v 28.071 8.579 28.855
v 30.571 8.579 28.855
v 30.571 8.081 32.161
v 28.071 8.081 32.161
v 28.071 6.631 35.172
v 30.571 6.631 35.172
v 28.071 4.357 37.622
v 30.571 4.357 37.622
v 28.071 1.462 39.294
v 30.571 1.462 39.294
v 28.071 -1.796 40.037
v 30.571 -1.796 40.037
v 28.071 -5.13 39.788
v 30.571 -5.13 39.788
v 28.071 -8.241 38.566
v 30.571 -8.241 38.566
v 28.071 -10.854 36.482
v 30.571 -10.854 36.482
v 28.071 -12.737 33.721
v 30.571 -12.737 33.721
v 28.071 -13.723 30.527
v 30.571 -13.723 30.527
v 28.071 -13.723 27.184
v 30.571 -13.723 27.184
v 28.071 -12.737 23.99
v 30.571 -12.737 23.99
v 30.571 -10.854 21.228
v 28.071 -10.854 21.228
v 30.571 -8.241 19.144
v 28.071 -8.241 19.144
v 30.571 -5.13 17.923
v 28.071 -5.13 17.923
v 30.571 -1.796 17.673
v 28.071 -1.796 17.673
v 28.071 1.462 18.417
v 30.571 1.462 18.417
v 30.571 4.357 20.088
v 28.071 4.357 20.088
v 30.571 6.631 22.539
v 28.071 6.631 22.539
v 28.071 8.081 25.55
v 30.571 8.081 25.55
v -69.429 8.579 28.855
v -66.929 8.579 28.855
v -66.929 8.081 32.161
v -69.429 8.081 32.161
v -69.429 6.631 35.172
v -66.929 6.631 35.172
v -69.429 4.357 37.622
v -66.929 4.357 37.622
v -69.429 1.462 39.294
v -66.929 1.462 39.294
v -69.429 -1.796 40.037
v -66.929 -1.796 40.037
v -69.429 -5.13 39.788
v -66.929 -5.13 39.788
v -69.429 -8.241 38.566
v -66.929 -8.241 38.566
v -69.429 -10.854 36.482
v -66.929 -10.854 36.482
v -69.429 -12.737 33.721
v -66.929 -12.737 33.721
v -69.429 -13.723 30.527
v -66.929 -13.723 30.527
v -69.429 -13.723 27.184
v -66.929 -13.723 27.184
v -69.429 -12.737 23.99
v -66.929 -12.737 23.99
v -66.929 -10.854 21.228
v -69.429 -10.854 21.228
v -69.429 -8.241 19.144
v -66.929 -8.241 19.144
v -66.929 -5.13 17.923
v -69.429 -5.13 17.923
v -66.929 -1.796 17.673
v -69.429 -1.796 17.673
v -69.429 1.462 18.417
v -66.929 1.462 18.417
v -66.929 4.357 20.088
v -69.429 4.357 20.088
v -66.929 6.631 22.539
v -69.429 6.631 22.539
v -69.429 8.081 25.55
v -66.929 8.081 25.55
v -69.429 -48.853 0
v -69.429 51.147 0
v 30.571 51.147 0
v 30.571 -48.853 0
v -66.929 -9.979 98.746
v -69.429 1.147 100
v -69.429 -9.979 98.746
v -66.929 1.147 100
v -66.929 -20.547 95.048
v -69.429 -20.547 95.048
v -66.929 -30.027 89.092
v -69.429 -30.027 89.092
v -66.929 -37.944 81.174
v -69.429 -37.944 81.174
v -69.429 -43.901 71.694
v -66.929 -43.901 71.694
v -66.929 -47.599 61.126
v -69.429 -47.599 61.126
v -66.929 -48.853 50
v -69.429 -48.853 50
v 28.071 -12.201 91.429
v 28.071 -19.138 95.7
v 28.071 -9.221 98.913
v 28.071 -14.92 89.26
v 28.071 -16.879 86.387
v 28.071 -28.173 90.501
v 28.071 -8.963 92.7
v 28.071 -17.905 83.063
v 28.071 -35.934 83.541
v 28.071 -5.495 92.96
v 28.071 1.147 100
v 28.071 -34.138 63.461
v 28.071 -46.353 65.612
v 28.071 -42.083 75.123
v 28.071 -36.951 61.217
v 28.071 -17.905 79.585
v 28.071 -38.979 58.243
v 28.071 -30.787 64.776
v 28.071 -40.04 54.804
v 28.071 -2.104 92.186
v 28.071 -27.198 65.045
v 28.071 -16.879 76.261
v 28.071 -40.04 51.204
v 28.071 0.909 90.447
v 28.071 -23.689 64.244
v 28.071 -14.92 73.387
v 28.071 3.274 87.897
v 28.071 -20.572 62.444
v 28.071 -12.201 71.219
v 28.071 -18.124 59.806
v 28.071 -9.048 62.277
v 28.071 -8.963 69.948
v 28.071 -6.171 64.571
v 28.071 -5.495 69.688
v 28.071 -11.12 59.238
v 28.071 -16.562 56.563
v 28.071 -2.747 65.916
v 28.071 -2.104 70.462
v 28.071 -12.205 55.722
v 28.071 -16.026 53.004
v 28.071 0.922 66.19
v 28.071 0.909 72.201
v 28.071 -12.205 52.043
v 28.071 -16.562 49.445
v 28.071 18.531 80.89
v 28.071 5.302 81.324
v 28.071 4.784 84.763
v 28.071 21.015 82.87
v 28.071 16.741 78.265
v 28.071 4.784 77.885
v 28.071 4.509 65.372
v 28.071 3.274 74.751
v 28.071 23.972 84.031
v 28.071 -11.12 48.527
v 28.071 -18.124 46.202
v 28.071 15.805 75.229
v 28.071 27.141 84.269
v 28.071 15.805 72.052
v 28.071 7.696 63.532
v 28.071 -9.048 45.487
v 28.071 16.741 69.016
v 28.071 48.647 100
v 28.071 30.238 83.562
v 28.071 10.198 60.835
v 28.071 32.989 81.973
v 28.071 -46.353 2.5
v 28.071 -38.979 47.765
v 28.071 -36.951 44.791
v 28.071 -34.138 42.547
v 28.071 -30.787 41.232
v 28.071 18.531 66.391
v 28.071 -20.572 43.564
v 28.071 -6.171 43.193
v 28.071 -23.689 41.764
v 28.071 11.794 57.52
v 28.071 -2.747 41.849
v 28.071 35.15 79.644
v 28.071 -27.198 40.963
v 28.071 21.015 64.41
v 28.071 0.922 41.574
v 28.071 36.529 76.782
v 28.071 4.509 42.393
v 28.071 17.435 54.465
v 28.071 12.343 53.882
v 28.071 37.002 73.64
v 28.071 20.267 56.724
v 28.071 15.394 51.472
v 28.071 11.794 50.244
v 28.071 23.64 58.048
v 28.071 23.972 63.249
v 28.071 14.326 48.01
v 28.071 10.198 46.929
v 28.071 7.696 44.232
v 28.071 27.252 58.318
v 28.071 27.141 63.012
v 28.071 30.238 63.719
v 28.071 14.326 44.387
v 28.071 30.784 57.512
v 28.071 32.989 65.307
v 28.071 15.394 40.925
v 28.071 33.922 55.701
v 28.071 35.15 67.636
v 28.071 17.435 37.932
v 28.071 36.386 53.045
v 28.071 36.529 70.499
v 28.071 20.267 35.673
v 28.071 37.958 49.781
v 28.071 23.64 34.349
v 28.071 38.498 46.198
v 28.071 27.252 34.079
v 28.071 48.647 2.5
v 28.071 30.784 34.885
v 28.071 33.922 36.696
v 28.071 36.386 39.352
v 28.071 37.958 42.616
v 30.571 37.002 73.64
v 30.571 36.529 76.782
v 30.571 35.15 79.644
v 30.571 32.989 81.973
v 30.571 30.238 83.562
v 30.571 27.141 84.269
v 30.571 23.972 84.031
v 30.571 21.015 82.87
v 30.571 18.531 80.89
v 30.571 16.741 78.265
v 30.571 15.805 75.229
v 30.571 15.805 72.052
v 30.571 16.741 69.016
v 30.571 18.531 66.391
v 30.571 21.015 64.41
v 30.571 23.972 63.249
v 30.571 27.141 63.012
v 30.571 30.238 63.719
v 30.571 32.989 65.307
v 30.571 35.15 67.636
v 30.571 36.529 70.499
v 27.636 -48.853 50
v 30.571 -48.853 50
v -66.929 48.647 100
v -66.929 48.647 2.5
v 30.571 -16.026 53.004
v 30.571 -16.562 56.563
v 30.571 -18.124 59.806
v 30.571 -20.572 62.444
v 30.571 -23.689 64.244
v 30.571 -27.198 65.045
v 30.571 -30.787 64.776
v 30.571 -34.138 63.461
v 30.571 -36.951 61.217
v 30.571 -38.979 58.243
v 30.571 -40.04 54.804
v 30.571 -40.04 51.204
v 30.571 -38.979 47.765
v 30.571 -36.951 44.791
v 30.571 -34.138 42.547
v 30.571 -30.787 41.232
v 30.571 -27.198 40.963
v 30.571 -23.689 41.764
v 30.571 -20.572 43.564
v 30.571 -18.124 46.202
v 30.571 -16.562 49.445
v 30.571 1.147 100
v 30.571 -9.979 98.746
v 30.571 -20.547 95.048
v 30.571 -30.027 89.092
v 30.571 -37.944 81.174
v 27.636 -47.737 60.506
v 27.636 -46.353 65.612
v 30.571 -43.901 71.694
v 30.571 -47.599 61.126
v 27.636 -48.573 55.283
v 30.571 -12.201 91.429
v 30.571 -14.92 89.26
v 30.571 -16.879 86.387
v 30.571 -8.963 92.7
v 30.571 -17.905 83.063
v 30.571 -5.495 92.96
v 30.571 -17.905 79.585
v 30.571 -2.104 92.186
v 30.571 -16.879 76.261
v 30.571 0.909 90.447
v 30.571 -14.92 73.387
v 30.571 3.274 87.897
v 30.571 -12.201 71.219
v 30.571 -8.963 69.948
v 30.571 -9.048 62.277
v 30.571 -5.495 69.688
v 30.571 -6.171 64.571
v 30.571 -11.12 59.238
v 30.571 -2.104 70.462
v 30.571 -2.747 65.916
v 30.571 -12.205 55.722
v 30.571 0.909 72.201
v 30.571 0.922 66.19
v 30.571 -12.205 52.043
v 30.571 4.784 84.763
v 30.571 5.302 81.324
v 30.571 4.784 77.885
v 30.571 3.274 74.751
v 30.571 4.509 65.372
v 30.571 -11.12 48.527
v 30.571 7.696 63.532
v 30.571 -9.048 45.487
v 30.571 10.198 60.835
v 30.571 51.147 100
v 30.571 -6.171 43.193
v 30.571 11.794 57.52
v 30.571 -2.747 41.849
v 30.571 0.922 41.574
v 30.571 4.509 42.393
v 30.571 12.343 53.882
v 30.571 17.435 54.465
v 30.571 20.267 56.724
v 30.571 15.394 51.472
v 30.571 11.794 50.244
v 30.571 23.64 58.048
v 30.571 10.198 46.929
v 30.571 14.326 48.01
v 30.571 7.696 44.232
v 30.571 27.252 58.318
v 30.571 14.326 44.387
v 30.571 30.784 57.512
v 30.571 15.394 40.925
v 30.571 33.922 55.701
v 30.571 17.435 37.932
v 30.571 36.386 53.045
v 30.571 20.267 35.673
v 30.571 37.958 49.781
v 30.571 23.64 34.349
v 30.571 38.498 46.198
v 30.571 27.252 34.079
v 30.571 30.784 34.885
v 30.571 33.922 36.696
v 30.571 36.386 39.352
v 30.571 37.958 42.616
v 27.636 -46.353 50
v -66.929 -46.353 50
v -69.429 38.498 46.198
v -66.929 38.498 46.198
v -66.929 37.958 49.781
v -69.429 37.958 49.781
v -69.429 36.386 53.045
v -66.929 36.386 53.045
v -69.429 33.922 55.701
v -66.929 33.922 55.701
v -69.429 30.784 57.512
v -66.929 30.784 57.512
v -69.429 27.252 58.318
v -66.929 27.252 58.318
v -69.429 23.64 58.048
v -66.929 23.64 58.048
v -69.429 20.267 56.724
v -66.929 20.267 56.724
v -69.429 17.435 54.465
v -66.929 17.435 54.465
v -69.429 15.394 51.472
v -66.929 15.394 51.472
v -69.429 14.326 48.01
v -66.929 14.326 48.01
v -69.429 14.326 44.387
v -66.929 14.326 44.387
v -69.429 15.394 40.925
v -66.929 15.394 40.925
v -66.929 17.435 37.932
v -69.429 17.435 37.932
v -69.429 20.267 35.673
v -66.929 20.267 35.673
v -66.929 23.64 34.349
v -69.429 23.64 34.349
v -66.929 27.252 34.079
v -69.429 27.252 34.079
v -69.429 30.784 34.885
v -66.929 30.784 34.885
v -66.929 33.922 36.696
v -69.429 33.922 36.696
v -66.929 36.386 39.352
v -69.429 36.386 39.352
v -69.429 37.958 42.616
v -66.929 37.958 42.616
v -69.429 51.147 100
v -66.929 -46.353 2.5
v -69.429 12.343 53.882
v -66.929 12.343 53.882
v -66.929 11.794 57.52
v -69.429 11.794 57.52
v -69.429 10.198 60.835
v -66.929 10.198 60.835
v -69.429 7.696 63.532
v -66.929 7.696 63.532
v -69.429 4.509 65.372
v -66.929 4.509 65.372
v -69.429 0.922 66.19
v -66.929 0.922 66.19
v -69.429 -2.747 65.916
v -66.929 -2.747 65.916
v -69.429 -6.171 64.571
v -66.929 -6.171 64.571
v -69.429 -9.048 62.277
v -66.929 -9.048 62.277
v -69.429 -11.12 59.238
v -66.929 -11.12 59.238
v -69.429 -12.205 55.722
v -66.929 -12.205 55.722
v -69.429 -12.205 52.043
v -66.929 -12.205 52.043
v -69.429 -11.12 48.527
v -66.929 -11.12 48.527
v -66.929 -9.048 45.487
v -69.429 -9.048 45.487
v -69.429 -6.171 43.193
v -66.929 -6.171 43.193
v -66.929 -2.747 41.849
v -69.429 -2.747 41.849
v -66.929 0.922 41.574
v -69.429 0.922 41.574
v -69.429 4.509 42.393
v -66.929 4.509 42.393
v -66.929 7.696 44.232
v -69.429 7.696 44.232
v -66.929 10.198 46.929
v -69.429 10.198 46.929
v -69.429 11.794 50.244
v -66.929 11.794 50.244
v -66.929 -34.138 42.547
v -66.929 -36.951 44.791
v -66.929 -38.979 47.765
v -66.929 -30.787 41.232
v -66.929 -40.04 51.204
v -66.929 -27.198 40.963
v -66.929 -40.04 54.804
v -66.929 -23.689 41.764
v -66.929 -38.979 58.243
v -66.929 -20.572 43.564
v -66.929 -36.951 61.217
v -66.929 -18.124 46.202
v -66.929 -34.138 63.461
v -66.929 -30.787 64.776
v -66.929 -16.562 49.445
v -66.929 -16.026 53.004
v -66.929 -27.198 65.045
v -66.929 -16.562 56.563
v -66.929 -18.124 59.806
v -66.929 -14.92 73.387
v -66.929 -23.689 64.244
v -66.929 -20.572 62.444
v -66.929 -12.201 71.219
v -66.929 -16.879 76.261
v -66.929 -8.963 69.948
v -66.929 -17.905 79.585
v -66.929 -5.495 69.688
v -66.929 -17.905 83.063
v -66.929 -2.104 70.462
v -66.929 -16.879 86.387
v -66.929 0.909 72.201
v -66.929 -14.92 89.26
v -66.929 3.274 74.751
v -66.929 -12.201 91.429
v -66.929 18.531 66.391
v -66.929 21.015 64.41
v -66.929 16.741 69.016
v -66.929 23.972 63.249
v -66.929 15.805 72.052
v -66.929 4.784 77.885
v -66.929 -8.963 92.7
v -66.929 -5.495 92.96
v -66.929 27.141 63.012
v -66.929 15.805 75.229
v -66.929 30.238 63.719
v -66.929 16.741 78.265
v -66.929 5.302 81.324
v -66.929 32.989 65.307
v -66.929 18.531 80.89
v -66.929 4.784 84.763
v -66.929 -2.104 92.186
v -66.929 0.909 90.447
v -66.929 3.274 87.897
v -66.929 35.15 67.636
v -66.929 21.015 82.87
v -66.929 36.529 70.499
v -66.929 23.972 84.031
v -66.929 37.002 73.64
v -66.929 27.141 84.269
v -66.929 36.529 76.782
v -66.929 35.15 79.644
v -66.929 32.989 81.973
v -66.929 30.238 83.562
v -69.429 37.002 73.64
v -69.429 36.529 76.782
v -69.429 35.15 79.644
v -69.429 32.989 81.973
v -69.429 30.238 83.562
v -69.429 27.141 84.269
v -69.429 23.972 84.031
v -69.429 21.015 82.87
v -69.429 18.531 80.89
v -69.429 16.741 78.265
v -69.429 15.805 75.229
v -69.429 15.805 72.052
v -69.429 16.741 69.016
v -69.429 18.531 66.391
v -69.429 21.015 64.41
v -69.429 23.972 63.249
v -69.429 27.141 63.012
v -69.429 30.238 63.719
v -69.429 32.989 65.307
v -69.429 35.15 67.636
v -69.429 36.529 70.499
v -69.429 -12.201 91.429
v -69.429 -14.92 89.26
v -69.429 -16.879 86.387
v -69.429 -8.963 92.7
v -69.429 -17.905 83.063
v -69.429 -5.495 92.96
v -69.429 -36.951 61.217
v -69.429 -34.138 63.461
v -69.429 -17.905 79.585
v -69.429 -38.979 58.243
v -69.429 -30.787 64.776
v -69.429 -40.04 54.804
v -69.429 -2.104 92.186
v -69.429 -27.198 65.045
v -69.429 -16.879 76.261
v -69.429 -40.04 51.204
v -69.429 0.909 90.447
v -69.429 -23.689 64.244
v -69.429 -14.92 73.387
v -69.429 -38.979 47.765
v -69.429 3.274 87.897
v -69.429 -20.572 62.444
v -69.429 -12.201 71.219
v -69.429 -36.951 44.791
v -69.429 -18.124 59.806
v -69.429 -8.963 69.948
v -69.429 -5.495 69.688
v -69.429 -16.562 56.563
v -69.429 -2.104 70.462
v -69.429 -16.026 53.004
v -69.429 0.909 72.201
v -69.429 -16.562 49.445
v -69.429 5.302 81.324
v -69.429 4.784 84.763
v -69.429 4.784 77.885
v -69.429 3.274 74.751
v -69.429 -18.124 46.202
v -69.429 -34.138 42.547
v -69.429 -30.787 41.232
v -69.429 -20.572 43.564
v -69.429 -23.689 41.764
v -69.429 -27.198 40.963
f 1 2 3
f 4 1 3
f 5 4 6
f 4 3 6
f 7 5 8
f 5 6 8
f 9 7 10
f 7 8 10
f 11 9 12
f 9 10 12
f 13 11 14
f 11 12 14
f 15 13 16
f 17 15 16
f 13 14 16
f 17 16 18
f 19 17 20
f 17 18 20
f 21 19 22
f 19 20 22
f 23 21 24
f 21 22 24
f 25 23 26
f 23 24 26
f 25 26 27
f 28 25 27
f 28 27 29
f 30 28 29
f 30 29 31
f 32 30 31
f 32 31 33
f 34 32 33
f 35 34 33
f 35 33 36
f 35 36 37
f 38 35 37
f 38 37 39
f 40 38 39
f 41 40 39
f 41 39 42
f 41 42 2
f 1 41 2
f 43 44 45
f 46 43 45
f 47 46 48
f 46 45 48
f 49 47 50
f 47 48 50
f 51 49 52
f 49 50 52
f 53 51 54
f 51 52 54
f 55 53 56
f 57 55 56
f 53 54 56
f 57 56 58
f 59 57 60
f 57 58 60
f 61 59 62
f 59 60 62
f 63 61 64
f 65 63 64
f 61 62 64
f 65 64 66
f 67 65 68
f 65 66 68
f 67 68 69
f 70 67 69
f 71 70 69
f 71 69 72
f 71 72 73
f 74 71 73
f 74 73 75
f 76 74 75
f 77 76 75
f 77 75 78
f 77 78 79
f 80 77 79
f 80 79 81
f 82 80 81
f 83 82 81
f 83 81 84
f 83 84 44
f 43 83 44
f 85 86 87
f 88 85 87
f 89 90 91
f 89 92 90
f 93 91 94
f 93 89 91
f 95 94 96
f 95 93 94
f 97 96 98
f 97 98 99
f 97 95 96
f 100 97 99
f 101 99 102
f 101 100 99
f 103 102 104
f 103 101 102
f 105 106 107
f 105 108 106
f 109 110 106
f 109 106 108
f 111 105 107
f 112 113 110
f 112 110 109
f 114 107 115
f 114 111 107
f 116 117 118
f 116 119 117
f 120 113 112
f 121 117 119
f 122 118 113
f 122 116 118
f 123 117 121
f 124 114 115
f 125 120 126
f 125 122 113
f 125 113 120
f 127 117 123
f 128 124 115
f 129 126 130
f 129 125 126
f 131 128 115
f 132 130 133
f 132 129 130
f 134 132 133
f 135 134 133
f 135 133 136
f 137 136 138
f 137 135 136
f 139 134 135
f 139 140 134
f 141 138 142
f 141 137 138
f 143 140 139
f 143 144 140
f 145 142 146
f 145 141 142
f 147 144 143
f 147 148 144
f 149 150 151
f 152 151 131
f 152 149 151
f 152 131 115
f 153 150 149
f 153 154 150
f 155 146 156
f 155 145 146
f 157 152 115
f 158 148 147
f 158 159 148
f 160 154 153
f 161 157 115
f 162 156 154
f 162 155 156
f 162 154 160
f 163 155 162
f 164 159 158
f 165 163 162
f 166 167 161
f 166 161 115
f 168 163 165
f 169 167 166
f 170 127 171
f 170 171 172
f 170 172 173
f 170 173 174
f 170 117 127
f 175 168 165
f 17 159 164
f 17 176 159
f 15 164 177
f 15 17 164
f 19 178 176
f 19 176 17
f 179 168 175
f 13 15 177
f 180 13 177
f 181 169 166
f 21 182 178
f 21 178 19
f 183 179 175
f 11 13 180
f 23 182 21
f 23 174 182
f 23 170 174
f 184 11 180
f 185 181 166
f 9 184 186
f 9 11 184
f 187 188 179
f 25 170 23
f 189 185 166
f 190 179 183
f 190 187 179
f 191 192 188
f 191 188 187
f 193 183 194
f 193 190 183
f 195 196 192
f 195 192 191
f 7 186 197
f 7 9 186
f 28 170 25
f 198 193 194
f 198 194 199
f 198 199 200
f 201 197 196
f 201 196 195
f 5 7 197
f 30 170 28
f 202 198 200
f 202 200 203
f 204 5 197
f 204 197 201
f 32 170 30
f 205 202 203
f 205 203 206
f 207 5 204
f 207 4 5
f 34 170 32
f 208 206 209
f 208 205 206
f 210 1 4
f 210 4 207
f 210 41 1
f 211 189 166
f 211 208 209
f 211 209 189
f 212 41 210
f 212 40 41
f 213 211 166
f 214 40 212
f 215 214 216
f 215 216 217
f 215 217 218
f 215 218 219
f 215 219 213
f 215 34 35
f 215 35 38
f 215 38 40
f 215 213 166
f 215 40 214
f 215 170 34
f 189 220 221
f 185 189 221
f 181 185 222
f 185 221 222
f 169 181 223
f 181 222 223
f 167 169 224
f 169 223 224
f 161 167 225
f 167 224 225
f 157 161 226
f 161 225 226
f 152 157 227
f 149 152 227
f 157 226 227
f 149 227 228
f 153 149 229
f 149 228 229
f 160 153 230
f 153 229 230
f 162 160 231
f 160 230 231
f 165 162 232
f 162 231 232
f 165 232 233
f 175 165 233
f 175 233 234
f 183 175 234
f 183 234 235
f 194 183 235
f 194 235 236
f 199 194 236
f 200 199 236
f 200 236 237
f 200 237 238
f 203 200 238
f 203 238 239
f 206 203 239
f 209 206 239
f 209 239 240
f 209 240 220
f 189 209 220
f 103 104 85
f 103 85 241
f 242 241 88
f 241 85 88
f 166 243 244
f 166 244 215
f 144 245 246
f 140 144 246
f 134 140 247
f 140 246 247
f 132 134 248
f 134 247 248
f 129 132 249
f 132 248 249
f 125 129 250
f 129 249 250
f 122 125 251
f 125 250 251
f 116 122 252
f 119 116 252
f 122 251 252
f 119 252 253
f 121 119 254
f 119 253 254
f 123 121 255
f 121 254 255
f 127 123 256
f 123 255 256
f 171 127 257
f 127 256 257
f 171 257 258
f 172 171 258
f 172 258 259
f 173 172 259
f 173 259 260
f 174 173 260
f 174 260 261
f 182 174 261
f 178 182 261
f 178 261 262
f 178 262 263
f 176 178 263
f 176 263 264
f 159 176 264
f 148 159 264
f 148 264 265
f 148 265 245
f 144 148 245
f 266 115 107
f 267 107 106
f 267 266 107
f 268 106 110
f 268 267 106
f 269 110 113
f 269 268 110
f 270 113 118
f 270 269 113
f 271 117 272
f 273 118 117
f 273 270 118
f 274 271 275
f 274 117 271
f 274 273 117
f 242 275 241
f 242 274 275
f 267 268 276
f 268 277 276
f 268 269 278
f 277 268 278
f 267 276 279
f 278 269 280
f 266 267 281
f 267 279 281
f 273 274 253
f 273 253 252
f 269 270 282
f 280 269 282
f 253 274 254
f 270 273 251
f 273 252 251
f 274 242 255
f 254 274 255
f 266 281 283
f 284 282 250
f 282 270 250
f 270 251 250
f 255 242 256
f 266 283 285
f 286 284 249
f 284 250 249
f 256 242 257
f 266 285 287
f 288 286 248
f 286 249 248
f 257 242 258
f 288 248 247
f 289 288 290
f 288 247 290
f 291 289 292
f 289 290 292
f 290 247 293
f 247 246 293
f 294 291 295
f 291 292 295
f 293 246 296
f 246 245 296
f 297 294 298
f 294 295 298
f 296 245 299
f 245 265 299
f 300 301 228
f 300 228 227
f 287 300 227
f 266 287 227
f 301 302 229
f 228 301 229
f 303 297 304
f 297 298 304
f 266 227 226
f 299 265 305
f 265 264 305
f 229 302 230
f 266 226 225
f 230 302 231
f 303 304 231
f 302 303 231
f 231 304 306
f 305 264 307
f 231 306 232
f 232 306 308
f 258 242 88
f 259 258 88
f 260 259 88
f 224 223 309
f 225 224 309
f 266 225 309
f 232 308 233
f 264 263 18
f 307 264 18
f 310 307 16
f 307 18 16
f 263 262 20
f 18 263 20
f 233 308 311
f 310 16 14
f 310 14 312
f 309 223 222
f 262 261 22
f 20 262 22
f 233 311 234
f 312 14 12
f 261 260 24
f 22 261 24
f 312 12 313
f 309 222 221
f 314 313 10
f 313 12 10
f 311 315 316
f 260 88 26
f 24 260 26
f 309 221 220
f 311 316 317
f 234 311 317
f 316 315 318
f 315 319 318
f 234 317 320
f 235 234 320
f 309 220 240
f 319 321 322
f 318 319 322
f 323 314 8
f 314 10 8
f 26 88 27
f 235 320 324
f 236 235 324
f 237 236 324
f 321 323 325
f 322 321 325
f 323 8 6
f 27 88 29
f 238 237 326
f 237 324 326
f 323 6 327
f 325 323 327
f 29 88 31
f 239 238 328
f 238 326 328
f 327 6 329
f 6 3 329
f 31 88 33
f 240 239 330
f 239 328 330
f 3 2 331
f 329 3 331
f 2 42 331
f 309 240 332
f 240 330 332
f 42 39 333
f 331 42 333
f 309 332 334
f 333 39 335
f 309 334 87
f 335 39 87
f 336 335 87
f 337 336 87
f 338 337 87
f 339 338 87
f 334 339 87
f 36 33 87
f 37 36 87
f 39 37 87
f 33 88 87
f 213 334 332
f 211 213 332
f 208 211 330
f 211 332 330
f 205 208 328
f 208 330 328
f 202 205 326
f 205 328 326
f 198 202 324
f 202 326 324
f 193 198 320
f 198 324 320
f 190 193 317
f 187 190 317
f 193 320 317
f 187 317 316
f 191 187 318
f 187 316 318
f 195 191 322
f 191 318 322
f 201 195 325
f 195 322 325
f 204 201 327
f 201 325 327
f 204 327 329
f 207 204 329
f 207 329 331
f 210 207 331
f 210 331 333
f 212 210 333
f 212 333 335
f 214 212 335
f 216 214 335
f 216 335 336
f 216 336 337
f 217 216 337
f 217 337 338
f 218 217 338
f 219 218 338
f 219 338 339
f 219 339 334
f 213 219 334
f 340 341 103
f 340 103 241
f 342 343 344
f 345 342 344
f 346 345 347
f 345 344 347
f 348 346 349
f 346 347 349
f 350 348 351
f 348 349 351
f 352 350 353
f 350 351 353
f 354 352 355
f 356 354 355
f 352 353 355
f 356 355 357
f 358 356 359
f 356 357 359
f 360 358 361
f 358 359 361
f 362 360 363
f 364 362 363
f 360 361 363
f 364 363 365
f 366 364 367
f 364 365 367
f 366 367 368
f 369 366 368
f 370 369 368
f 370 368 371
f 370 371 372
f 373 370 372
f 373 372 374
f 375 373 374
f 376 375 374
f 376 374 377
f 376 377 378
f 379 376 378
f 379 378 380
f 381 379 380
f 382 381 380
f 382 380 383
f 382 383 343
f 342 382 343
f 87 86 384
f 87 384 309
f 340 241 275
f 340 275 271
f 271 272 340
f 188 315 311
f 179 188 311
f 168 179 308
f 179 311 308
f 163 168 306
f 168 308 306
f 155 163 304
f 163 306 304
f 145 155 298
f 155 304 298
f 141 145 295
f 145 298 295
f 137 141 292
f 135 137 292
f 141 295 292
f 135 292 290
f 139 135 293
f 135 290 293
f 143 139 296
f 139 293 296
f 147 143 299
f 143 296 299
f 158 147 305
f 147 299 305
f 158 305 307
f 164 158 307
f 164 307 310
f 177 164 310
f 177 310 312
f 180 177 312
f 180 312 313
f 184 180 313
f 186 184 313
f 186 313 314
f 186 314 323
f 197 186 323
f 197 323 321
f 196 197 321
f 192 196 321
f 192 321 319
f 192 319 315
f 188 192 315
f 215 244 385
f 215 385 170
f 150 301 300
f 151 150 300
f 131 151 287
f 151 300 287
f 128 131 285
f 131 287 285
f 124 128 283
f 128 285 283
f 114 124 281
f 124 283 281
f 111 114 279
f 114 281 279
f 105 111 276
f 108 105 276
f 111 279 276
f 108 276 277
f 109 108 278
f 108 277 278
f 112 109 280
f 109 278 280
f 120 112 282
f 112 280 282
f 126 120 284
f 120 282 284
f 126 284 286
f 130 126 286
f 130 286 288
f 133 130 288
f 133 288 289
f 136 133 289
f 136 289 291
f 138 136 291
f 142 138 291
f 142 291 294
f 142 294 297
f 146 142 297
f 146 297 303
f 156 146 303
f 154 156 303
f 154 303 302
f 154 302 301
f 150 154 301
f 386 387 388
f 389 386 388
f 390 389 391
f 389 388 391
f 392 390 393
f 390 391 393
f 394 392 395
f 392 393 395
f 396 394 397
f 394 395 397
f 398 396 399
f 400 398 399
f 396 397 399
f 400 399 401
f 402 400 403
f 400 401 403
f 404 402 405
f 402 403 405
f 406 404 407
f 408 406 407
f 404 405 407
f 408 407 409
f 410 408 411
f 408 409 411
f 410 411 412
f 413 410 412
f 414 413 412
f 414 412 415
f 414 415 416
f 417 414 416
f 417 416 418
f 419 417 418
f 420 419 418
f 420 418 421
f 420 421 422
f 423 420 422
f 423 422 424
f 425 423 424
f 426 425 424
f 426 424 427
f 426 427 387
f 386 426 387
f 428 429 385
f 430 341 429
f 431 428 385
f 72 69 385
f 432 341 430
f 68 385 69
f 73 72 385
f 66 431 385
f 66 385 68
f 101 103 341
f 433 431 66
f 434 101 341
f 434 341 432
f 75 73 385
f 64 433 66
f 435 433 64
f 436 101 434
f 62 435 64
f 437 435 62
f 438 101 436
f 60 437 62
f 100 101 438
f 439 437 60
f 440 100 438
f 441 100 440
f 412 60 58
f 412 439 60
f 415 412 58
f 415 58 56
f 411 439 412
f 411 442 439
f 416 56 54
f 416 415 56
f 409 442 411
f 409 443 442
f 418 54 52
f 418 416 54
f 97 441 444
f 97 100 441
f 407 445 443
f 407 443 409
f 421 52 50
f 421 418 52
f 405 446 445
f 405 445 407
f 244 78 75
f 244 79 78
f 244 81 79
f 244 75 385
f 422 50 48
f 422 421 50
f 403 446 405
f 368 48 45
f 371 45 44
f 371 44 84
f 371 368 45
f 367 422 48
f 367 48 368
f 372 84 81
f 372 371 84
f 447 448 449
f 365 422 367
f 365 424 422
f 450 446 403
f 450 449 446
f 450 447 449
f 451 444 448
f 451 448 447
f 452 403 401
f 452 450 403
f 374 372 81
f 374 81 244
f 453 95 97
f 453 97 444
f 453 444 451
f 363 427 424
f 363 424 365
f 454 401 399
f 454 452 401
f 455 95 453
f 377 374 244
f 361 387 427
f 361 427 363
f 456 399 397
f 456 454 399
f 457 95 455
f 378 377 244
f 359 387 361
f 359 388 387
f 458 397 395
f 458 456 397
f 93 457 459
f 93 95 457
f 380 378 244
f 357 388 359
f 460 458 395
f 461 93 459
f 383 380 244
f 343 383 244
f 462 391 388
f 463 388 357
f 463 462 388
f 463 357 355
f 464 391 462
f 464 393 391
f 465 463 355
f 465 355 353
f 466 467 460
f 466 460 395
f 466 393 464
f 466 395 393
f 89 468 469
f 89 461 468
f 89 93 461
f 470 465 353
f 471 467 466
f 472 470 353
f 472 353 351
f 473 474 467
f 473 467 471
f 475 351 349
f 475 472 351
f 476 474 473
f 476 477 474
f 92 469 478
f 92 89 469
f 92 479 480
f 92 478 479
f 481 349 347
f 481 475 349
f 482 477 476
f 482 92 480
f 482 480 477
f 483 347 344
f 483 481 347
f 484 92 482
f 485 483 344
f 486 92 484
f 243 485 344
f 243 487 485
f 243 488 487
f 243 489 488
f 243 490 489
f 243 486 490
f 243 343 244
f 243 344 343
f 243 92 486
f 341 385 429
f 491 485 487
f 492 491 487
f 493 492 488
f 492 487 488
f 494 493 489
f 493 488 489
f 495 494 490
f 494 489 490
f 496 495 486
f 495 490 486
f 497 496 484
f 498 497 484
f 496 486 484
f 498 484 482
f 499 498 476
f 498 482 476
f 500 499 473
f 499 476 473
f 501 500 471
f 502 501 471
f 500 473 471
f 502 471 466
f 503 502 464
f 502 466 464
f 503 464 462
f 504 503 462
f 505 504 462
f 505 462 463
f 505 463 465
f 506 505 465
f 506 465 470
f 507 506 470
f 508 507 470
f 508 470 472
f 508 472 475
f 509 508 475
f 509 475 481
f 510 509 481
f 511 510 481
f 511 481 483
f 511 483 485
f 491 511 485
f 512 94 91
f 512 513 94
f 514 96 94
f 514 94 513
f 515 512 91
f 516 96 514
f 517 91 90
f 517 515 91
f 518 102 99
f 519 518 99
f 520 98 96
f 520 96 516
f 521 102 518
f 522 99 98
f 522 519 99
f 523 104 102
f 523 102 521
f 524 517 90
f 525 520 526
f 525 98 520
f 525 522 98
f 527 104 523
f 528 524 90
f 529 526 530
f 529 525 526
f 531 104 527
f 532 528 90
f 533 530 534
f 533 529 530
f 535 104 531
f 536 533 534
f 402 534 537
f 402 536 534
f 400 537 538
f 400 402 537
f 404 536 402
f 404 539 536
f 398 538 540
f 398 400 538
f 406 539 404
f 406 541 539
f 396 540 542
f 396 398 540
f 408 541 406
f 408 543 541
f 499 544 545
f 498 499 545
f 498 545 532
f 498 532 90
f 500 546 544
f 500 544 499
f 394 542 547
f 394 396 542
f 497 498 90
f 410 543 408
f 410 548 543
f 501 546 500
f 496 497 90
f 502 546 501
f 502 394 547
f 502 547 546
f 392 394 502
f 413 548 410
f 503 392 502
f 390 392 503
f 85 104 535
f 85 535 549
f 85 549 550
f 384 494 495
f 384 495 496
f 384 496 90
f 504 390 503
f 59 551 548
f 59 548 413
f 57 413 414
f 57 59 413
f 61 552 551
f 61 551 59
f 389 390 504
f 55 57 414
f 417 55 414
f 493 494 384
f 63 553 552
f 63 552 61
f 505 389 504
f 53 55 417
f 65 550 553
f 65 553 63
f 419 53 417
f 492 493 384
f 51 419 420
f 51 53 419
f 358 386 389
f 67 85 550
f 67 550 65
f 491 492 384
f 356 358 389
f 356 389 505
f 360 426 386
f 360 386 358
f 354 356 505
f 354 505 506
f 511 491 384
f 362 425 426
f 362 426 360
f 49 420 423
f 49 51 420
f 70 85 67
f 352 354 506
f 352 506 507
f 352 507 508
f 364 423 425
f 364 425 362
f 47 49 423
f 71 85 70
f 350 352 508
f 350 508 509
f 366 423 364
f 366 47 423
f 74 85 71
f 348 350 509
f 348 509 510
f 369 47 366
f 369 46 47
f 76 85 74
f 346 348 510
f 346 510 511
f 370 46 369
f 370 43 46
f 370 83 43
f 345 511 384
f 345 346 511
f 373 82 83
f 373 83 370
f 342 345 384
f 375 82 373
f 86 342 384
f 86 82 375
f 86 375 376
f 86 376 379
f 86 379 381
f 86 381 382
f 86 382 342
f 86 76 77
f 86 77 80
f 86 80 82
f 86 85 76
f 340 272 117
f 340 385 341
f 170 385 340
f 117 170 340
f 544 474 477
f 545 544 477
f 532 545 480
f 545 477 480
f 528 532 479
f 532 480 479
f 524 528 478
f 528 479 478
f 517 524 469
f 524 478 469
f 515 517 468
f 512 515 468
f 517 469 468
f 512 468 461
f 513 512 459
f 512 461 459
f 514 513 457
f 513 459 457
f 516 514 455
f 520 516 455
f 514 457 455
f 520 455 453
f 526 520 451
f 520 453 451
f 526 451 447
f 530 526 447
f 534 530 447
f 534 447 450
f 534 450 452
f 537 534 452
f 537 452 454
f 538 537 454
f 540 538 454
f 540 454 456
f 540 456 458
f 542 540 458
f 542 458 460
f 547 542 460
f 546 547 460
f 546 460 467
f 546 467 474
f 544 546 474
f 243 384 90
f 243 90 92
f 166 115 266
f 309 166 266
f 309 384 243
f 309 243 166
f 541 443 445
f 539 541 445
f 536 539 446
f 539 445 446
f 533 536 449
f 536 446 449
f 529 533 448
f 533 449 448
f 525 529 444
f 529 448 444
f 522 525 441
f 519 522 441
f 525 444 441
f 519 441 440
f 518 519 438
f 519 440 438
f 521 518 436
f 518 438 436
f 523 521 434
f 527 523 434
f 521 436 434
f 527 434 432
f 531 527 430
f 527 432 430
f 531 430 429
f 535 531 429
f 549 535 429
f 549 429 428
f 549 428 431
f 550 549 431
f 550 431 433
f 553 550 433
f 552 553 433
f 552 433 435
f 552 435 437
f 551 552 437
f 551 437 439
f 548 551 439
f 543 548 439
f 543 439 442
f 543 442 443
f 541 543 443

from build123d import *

# Parameters (mm, degrees)
F0_W     = 100
F0_H     = 100
F1_DEPTH = 100
F2_T     = -2.5
F3_W     = 94.5649716185
F3_H     = 2.5
F4_DEPTH = 50
F5_R     = 50
F6_R     = 12.0743721724
F6_R_2   = 11.213441631
F6_R_3   = 12.3428155876
F6_R_4   = 11.6683976529
F6_R_5   = 10.6581459458
F6_R_6   = 12.1539399679
F7_DEPTH = 100.001


with BuildPart() as f1:
    # F0 (on Top) → F1 (new body)
    with BuildSketch(Plane.XY):
        with Locations((-19.4285236971, 1.1470969766)):
            Rectangle(F0_W, F0_H)
    extrude(amount=F1_DEPTH)

    # F2
    f2_openings = [f1.faces().sort_by_distance(p)[0] for p in [
        (-19.428524, 1.147097, 100),
    ]]
    offset(amount=F2_T, openings=f2_openings)

    # F3 (on face) → F4 (cut)
    with BuildSketch(Plane.XY.offset(100)):
        with Locations((-19.6460378879, -47.6029030234)):
            Rectangle(F3_W, F3_H)
    extrude(amount=-F4_DEPTH, mode=Mode.SUBTRACT)

    # F5
    f5_edges = [f1.edges().sort_by_distance(p)[0] for p in [
        (-68.178524, -48.852903, 100),
        (29.103962, -48.852903, 100),
    ]]
    fillet(f5_edges, radius=F5_R)

    # F6 (on face) → F7 (cut, through all)
    with BuildSketch(Plane.YZ.offset(30.5714763029)):
        with Locations((-28.1003583223, 53.0040338635)):
            Circle(F6_R)
        with Locations((-2.6344081853, 28.8552865386)):
            Circle(F6_R_2)
        with Locations((0, 53.8821704686)):
            Circle(F6_R_3)
        with Locations((-6.3664885238, 81.323929131)):
            Circle(F6_R_4)
        with Locations((26.3440869749, 73.6402347684)):
            Circle(F6_R_5)
        with Locations((26.3440869749, 46.1984761059)):
            Circle(F6_R_6)
    extrude(amount=-F7_DEPTH, mode=Mode.SUBTRACT)


solid = f1.part
